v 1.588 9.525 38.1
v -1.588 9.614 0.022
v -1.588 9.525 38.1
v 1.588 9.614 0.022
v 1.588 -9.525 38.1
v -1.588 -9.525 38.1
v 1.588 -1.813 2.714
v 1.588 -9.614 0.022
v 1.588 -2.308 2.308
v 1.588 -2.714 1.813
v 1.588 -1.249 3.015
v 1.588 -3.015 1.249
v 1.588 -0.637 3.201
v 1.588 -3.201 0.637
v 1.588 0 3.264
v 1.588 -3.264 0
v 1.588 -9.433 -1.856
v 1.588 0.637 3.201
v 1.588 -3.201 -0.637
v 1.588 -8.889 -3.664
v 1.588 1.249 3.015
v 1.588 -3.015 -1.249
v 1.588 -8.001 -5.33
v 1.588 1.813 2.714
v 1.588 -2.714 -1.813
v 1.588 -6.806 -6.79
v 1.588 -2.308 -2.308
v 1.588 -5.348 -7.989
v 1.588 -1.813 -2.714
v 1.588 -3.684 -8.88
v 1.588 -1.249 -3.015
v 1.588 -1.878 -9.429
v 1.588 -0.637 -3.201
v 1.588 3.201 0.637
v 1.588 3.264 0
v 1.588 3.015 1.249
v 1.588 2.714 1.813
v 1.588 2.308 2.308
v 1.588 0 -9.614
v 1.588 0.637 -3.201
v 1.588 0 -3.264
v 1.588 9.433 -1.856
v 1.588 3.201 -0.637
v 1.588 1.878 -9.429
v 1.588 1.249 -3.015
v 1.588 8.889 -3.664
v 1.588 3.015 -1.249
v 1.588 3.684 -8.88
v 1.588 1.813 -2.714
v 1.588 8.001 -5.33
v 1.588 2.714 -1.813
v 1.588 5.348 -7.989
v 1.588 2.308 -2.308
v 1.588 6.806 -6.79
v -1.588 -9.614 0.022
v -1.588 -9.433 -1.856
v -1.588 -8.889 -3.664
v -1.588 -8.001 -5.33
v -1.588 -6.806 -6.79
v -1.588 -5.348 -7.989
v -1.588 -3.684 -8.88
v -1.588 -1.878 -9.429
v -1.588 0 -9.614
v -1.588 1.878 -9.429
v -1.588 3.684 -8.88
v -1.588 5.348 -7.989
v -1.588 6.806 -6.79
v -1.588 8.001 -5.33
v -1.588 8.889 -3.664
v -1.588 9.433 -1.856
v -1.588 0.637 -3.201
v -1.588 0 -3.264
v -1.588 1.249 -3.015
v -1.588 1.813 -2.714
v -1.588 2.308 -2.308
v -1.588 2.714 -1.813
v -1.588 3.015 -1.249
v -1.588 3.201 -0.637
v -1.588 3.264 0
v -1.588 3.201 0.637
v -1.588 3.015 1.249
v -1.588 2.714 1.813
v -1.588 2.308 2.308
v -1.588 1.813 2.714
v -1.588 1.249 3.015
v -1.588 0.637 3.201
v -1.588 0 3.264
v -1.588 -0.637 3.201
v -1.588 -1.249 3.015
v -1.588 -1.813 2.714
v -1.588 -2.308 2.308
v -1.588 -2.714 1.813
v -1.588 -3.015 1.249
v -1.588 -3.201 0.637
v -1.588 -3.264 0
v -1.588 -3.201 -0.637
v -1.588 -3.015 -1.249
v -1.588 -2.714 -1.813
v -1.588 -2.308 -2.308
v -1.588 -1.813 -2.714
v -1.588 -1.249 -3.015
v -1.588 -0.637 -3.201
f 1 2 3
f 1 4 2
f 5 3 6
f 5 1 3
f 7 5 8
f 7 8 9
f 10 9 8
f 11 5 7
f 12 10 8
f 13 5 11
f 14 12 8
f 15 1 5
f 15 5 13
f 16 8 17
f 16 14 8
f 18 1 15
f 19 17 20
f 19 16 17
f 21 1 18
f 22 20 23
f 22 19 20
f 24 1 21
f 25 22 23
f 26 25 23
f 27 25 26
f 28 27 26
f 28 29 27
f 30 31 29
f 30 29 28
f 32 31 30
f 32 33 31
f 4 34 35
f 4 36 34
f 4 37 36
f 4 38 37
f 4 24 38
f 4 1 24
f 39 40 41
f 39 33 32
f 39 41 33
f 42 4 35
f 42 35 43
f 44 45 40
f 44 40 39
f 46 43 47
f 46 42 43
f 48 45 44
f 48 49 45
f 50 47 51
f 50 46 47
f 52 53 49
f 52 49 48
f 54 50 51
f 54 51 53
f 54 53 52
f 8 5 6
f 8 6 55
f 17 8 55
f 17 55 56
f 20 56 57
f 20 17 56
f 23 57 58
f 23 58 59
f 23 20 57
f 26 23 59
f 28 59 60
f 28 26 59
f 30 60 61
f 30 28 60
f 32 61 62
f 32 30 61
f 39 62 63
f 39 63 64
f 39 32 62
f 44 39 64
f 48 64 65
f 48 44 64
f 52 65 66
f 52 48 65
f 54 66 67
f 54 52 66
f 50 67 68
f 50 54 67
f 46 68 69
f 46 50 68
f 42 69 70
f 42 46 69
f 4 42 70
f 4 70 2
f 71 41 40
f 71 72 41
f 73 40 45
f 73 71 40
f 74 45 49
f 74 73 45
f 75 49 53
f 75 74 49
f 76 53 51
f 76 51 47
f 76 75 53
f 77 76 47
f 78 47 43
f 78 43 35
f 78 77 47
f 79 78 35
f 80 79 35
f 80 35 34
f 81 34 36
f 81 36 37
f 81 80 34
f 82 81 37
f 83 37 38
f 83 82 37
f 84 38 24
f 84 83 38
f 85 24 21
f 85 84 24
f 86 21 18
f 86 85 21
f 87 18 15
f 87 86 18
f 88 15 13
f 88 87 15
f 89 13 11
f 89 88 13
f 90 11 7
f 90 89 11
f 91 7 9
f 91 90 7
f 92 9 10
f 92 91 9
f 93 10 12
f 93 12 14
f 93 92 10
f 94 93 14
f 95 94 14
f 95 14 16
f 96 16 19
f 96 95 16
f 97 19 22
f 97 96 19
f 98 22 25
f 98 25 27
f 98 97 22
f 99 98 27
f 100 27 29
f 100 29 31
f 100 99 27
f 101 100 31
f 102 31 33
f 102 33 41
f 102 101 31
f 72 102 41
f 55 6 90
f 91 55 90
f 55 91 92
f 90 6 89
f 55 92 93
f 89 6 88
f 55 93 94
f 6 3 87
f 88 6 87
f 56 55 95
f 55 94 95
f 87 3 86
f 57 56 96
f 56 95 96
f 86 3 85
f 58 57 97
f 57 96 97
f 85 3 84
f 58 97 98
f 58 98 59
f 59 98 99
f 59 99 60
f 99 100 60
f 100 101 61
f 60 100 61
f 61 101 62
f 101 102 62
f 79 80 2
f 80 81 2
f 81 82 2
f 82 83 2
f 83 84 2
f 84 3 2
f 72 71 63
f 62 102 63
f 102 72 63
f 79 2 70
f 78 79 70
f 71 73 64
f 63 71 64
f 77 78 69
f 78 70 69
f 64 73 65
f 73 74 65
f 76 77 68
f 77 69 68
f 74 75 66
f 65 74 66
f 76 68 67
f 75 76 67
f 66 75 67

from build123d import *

# Parameters (mm, degrees)
SKETCH1_R           = 3.2639
BOSS_EXTRUDE1_DEPTH = 1.5875


with BuildPart() as part:
    # Sketch1 → Boss-Extrude1 (new body, symmetric)
    with BuildSketch(Plane(origin=(0, 0, 0), x_dir=(0, 0, -1), z_dir=(1, 0, 0))):
        with BuildLine():
            Line((-38.1, 9.525), (-38.1, -9.525))
            Line((-38.1, -9.525), (-0.02243898, -9.613873814))
            ThreePointArc((-0.02243898, -9.613873814), (9.6139, 0), (-0.02243898, 9.613873814))
            Line((-0.02243898, 9.613873814), (-38.1, 9.525))
        make_face()
        Circle(SKETCH1_R, mode=Mode.SUBTRACT)
    extrude(amount=BOSS_EXTRUDE1_DEPTH, both=True)


solid = part.part
